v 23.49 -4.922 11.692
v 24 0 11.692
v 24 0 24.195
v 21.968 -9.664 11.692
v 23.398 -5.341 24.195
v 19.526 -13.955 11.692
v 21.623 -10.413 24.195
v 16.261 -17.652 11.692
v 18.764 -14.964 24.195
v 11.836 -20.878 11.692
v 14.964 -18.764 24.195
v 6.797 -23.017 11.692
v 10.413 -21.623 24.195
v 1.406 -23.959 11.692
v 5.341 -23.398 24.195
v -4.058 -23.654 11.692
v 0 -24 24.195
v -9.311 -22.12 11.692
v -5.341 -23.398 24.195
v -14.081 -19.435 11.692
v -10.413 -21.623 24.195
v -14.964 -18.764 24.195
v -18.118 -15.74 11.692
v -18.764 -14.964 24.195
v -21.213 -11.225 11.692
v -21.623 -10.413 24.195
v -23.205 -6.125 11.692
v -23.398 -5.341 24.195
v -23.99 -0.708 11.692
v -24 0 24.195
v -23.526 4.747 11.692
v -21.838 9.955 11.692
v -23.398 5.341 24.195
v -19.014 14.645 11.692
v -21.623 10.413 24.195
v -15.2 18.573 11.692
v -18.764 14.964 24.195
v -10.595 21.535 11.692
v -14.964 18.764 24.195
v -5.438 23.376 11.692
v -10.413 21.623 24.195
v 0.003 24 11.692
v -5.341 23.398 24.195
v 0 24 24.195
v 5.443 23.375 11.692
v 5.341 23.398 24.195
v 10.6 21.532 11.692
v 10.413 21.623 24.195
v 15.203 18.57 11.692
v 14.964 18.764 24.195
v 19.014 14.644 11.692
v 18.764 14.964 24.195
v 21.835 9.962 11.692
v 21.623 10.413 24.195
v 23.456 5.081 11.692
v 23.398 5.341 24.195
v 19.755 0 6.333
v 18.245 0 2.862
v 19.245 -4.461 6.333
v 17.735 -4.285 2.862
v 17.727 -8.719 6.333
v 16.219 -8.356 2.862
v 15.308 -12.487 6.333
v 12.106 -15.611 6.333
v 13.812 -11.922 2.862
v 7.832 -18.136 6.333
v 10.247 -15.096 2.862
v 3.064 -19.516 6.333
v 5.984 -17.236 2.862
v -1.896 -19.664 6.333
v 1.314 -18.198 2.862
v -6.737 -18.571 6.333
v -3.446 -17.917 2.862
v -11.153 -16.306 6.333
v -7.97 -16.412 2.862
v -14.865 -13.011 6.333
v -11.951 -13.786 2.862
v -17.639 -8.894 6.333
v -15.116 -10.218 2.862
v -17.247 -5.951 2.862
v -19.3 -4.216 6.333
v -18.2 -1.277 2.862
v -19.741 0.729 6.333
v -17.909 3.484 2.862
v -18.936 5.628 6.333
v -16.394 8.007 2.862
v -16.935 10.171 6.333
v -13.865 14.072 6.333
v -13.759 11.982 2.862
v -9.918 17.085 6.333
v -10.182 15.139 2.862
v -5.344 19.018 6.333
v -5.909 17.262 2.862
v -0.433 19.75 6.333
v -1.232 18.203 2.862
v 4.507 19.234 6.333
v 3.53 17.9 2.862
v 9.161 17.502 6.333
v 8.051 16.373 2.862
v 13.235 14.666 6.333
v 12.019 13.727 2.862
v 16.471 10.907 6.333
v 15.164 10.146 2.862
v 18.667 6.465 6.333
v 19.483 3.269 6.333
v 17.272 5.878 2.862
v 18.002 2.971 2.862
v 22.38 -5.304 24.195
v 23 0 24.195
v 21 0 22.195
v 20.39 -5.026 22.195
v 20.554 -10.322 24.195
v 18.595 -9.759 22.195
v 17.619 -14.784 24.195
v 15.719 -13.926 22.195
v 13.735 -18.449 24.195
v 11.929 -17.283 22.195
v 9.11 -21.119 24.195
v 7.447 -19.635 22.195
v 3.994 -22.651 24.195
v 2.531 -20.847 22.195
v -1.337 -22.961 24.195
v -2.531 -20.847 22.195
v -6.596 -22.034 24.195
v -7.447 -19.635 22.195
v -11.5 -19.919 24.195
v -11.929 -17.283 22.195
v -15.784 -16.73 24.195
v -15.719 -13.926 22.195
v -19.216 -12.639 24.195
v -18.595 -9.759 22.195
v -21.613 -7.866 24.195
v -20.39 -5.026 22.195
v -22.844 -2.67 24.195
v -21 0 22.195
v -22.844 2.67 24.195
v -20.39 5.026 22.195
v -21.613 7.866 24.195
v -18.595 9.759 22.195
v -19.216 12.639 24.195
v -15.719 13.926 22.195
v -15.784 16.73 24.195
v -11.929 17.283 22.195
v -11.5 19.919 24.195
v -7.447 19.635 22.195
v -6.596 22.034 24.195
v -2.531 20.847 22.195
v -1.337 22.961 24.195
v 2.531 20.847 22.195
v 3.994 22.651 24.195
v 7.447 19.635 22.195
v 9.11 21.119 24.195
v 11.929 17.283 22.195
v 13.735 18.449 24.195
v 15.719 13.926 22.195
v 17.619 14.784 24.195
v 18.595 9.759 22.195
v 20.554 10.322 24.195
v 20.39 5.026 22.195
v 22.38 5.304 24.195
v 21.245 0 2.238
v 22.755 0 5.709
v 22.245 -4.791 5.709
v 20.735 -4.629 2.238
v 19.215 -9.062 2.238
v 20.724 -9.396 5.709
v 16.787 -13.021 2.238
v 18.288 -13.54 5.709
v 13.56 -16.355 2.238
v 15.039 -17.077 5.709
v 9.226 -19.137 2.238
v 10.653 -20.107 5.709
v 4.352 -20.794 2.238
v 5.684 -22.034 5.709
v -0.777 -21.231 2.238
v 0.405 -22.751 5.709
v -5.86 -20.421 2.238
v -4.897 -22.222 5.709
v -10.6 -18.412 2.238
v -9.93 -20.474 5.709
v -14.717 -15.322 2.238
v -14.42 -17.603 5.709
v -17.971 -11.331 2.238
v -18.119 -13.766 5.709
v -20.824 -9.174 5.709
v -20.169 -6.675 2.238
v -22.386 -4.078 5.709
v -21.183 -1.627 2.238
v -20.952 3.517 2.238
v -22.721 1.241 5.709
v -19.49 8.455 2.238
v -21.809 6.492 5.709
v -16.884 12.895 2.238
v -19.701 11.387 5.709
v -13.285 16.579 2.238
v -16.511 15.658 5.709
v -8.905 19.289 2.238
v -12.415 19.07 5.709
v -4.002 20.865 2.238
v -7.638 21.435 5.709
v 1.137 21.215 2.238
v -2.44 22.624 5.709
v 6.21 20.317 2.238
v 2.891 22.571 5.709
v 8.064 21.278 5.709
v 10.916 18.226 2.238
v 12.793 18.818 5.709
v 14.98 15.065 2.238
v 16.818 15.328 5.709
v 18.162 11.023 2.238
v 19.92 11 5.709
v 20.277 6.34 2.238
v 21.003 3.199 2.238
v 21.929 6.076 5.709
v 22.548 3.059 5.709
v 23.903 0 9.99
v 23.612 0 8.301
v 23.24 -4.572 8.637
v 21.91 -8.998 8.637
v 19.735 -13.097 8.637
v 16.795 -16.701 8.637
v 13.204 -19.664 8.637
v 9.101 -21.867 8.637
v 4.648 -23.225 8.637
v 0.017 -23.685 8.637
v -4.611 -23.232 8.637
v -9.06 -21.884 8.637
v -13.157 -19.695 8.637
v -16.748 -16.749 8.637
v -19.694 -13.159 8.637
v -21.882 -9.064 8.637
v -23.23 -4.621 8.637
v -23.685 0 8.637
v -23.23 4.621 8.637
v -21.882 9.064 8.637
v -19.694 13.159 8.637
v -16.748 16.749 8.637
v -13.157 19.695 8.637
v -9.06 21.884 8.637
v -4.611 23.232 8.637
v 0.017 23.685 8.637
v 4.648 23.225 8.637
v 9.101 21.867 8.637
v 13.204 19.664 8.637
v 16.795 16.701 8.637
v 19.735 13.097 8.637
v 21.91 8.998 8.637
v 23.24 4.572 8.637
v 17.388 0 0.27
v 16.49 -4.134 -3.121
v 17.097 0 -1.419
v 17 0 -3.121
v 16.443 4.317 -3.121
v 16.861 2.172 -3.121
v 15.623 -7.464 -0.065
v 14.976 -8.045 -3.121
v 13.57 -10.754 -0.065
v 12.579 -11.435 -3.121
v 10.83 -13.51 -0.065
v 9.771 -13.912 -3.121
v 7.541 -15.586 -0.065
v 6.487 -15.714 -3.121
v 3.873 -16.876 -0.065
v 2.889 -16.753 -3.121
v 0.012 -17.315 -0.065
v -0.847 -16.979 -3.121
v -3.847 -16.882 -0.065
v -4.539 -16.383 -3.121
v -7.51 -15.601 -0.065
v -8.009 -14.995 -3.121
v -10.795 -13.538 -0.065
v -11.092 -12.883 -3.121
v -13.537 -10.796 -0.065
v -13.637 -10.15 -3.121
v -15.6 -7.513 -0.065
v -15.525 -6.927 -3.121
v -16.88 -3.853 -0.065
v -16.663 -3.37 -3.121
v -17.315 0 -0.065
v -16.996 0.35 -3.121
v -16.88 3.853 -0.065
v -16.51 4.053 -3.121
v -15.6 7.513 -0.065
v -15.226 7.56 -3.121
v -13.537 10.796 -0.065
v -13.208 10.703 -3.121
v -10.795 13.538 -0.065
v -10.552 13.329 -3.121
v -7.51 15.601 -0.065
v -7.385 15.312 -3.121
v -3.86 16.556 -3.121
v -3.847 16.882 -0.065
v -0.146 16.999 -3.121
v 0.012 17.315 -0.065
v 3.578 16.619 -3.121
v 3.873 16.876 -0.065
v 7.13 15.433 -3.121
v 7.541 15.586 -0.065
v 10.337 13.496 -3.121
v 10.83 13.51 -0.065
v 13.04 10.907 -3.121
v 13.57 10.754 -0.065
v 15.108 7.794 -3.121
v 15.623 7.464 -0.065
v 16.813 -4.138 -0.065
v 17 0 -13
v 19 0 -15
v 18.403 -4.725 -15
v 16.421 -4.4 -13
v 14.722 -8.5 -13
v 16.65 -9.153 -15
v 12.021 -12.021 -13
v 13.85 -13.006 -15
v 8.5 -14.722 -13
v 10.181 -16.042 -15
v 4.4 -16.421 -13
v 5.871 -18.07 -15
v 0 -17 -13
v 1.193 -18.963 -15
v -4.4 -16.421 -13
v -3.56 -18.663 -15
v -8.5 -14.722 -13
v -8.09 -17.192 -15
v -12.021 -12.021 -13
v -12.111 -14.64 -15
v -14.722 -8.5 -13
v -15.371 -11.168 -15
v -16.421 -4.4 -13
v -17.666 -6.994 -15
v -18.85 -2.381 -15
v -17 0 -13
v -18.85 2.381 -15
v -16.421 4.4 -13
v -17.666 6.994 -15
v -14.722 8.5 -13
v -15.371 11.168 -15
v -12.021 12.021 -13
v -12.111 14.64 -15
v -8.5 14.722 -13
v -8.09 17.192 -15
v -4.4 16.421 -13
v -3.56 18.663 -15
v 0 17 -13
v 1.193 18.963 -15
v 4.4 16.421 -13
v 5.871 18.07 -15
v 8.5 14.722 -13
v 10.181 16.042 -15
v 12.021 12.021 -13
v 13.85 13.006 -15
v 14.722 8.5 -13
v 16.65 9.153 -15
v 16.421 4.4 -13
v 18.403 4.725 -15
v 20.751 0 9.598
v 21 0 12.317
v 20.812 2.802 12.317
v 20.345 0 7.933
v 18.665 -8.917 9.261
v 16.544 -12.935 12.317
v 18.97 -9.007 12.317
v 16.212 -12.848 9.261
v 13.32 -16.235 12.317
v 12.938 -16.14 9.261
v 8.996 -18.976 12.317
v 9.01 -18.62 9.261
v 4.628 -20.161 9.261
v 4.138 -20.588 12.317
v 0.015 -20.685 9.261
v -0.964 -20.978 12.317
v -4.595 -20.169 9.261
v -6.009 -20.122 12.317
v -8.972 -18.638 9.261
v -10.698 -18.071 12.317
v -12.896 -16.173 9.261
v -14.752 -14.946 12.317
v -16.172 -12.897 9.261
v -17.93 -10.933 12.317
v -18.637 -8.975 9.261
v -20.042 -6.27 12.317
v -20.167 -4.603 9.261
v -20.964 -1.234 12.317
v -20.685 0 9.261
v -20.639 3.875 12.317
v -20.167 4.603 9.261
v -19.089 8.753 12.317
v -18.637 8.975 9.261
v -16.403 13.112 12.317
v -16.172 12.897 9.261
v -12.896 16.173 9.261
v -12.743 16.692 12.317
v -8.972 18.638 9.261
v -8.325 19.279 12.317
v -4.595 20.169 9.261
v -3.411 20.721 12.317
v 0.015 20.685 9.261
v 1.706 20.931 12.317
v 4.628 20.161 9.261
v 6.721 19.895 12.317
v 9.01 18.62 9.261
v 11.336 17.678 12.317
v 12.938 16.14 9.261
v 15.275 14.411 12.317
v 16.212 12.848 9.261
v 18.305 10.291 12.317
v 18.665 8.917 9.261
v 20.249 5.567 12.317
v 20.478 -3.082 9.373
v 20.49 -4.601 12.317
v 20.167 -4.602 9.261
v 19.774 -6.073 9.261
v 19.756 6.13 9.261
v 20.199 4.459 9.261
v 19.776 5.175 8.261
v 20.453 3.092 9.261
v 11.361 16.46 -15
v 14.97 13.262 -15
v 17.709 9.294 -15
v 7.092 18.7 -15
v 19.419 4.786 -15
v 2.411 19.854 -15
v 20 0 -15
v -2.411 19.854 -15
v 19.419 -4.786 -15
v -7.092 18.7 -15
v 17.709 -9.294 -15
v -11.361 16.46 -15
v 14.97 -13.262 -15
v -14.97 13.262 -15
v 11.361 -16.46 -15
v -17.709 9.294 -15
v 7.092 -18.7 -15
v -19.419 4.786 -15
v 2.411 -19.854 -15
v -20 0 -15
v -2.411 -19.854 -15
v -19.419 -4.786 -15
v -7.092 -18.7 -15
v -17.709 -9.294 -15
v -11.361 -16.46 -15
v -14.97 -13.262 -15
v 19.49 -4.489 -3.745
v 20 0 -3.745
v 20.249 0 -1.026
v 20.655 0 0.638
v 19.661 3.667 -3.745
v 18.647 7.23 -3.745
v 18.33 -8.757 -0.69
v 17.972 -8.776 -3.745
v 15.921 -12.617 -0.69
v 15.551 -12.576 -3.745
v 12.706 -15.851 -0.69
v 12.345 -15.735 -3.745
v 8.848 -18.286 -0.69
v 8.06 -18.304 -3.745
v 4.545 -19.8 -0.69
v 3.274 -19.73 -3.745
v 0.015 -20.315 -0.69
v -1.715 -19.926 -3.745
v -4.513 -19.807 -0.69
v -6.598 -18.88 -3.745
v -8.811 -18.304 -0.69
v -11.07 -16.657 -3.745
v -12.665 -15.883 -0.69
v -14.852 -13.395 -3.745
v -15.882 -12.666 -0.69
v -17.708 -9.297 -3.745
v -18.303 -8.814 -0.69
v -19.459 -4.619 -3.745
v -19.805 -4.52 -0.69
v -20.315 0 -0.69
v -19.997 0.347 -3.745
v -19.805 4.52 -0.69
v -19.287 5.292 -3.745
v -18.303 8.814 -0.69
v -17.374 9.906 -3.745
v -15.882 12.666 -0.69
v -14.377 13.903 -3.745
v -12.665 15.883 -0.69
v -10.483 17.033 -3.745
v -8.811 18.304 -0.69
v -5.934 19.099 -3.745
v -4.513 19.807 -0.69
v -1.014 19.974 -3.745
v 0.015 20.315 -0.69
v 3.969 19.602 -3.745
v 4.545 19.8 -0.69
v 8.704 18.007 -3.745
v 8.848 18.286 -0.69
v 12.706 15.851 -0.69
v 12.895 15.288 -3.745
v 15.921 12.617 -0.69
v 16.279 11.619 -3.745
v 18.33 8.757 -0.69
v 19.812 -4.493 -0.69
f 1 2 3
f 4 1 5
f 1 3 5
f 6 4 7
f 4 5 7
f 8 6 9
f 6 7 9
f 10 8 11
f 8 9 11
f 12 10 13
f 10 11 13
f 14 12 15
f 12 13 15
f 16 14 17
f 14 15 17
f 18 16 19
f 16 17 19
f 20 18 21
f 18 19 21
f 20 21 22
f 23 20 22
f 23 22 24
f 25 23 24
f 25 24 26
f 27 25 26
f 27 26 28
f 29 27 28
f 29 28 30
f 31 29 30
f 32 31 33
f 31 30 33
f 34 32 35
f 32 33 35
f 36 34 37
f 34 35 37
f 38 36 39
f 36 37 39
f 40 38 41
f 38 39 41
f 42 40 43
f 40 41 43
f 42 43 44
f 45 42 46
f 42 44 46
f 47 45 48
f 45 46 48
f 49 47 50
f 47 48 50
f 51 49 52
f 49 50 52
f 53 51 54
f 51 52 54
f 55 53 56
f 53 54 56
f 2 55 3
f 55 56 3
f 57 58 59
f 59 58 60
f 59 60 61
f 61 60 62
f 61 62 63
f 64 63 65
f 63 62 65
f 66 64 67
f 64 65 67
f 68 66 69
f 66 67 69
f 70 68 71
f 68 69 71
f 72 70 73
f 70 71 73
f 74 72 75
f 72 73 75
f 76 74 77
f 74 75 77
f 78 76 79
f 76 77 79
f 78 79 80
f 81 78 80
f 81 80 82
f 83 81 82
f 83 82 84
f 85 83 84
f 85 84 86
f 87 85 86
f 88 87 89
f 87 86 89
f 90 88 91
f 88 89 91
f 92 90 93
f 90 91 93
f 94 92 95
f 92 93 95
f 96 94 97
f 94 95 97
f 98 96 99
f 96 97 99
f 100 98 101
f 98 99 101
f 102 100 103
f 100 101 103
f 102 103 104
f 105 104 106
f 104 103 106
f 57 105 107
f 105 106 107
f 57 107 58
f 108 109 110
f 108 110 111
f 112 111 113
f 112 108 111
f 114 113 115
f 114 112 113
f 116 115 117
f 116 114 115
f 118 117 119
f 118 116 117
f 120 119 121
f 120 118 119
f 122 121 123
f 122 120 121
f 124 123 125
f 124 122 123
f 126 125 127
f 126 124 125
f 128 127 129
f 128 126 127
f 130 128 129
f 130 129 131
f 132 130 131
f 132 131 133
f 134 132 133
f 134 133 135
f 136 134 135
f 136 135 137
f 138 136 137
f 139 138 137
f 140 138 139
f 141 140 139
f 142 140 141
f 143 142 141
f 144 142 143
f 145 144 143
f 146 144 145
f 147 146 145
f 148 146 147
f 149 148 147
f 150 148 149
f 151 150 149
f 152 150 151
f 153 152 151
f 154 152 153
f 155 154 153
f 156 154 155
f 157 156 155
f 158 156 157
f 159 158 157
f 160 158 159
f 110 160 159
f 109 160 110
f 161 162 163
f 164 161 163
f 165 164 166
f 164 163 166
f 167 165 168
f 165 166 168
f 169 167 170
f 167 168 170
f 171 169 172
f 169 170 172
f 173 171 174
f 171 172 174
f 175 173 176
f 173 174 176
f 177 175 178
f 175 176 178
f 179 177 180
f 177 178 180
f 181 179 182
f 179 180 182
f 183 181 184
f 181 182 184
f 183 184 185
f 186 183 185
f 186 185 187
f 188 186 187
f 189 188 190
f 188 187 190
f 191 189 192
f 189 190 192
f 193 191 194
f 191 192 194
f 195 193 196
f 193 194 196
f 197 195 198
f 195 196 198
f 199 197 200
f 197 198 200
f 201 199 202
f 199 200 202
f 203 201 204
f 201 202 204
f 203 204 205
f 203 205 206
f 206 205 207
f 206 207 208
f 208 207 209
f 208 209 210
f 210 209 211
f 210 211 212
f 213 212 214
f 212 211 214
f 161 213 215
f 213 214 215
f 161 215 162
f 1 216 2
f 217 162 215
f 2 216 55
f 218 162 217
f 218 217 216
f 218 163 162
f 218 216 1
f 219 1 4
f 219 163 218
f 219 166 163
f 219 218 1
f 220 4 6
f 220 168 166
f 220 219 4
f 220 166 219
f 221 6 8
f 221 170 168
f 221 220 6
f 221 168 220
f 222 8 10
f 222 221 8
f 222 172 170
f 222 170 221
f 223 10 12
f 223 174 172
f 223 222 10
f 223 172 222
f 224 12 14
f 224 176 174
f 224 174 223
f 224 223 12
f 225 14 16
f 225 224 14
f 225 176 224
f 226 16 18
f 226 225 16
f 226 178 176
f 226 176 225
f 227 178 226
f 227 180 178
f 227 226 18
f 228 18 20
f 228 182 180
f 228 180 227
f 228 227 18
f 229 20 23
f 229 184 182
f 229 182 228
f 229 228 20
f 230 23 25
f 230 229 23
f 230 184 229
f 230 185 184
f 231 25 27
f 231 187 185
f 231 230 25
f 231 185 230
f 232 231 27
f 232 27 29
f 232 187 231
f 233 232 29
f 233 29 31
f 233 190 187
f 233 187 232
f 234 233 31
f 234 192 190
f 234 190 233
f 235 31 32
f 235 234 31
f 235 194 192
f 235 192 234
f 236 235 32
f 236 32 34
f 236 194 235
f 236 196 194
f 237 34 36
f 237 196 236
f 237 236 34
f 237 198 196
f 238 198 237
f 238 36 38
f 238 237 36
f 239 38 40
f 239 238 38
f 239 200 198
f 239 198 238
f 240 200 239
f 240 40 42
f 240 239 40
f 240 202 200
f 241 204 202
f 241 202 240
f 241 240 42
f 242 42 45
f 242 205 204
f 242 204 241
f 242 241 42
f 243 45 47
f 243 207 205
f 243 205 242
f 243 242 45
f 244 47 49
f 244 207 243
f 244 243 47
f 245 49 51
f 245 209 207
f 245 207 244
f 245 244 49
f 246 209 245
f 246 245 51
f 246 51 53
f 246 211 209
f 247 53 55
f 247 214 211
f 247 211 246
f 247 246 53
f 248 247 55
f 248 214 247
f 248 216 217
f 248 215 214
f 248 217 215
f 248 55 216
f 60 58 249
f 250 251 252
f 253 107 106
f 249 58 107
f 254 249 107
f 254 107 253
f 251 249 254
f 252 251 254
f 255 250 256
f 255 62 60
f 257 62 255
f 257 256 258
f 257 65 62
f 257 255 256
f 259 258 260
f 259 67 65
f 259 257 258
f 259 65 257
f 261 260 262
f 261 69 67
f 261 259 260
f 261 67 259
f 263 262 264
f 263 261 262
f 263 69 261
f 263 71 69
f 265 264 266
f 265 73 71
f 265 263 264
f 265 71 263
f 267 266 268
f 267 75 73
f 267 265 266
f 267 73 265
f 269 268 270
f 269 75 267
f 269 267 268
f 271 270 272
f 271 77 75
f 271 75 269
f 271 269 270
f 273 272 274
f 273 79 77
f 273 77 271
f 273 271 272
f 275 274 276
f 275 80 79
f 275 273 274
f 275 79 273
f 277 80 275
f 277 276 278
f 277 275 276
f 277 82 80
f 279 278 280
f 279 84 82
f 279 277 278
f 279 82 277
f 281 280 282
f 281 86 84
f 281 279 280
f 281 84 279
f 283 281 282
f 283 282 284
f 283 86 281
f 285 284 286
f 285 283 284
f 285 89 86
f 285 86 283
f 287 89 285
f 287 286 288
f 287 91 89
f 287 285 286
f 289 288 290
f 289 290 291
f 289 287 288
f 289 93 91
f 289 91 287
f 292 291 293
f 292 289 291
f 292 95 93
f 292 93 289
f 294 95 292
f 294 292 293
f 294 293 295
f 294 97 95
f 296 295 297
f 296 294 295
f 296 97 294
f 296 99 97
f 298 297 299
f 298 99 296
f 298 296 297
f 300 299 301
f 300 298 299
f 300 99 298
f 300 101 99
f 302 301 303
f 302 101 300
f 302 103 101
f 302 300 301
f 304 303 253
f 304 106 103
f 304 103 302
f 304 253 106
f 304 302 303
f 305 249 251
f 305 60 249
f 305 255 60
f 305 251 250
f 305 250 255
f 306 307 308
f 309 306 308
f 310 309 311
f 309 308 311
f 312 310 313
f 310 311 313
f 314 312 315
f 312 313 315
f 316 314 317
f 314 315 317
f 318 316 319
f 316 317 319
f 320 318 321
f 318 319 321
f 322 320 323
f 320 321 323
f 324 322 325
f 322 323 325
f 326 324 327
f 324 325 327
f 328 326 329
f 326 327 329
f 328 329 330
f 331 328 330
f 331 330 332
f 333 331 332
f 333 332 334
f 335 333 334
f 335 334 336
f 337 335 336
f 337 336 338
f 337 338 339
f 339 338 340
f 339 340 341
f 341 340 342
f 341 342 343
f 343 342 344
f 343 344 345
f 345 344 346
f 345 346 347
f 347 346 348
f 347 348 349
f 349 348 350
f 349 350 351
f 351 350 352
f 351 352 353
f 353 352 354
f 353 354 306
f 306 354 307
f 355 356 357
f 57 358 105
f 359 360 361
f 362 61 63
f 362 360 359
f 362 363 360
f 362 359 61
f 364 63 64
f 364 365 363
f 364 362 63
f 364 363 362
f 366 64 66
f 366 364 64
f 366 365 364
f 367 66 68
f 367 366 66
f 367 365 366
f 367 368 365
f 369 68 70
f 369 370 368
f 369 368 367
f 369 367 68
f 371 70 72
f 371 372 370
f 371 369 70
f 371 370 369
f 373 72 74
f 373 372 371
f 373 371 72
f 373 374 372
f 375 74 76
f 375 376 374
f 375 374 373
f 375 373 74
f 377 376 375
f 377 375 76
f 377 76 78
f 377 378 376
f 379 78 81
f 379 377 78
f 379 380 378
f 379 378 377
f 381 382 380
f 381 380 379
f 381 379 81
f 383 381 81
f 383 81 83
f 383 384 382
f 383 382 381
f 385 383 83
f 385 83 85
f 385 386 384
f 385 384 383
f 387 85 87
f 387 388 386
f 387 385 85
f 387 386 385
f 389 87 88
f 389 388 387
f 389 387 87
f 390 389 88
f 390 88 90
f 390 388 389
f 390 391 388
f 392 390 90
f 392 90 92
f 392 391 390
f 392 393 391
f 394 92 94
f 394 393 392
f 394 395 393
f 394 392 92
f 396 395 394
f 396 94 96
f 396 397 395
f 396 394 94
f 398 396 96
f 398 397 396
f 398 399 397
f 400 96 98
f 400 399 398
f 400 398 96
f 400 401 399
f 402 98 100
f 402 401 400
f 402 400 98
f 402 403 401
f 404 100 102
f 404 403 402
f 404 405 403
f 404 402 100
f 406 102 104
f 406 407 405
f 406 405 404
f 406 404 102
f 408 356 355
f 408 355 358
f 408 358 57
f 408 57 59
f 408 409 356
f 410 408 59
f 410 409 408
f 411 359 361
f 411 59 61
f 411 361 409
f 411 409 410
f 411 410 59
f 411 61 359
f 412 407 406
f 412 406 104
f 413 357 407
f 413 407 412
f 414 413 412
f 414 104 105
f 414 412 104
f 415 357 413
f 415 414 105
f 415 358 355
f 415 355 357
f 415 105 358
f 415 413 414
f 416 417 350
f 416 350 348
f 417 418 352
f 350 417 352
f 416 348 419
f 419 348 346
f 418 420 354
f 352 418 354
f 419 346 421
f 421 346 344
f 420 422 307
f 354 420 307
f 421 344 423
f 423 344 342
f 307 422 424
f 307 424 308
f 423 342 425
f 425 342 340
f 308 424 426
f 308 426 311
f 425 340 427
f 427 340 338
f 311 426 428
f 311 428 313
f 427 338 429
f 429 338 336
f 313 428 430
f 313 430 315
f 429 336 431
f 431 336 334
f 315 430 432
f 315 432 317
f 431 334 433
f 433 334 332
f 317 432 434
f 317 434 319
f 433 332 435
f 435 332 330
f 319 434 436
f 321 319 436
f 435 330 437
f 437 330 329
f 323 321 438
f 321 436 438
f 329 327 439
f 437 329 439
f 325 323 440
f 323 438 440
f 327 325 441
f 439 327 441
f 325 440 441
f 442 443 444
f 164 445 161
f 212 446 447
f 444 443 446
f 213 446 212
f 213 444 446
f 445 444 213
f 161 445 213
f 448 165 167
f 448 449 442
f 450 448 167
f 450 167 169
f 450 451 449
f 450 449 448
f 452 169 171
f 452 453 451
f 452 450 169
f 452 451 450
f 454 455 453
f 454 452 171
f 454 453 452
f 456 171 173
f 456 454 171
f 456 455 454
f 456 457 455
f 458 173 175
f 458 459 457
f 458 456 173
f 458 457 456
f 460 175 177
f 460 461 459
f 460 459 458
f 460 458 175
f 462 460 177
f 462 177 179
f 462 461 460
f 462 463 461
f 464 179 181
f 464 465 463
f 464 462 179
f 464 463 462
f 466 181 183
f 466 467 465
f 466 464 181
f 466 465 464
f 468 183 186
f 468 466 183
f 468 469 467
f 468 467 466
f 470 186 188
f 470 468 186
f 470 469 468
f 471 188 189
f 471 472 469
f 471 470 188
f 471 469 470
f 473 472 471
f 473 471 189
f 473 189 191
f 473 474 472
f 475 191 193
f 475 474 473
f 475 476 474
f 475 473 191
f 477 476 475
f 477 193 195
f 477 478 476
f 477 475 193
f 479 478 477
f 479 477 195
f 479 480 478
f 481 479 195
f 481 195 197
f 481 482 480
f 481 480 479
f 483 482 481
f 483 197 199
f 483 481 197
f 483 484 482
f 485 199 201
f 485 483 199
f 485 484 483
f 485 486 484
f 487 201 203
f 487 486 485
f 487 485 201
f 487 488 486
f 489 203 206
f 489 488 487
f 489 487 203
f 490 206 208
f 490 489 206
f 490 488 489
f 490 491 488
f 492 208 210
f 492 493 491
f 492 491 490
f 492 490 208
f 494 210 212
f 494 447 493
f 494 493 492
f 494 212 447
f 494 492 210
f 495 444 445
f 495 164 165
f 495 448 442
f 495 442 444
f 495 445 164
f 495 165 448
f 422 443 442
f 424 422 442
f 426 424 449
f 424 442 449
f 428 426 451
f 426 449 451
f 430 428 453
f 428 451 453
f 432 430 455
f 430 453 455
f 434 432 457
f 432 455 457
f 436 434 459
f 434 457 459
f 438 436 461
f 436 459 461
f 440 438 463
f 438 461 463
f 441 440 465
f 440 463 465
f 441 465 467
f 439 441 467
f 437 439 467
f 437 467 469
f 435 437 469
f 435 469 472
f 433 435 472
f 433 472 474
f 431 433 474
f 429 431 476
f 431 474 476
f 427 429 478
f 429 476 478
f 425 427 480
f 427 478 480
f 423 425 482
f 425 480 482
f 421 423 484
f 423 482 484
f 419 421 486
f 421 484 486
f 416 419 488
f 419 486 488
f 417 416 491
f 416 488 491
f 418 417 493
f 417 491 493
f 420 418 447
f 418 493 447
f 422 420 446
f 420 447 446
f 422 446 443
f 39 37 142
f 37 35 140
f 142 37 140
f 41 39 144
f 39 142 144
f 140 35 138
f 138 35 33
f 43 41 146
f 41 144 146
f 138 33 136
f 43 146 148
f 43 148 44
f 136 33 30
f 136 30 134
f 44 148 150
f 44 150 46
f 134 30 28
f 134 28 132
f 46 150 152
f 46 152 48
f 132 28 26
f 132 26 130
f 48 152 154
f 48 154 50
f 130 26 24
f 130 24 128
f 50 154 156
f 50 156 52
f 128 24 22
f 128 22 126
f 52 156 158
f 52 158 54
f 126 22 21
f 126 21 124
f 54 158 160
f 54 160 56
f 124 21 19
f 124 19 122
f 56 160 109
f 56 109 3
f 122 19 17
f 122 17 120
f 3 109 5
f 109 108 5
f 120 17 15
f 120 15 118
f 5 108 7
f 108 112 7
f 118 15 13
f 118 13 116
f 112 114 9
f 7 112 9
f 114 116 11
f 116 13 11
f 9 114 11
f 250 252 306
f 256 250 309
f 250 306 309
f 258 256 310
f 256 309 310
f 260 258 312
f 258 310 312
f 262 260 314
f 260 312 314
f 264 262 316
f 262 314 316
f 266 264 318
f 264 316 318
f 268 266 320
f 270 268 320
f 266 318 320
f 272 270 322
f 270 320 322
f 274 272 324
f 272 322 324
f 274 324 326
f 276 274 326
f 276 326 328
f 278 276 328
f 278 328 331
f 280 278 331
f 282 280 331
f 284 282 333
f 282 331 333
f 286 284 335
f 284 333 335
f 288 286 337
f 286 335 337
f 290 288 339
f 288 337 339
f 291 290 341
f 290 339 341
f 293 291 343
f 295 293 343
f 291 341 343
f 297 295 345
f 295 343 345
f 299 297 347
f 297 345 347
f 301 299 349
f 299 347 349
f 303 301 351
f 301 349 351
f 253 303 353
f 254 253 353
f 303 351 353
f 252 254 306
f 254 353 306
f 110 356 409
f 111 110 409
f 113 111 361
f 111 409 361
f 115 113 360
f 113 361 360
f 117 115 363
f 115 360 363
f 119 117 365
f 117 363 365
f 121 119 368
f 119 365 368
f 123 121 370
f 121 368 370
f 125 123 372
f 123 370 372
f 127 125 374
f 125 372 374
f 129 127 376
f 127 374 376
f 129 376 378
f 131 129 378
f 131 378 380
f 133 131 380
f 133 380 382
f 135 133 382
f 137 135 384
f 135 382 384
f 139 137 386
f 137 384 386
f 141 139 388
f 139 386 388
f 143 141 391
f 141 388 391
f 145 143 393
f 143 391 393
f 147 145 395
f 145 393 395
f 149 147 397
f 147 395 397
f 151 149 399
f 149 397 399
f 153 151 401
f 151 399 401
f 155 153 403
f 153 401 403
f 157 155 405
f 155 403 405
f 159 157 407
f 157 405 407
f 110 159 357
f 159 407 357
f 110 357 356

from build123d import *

# Parameters (mm, degrees)
F2_R    = 15
F3_SIZE = 2


with BuildPart() as f1:
    # F0 (on Front) → F1 (revolve)
    with BuildSketch(Plane.XZ):
        Polygon((24, 24.195369), (21, 24.195369), (21, 9.195369), (17, 0), (17, -15), (20, -15), (20, -0.62425), (24, 8.571119), align=None)
    revolve(axis=Axis((0, 0, 5.12058), (0, 0, -1)))

    # F2
    f2_edges = [f1.edges().sort_by_distance(p)[0] for p in [
        (-20, 0, -0.62425),
        (-24, 0, 8.571119),
        (-21, 0, 9.195369),
        (-17, 0, 0),
    ]]
    fillet(f2_edges, radius=F2_R)

    # F3
    f3_edges = [f1.edges().sort_by_distance(p)[0] for p in [
        (-21, 0, 24.195369),
        (-17, 0, -15),
    ]]
    chamfer(f3_edges, length=F3_SIZE)


solid = f1.part
